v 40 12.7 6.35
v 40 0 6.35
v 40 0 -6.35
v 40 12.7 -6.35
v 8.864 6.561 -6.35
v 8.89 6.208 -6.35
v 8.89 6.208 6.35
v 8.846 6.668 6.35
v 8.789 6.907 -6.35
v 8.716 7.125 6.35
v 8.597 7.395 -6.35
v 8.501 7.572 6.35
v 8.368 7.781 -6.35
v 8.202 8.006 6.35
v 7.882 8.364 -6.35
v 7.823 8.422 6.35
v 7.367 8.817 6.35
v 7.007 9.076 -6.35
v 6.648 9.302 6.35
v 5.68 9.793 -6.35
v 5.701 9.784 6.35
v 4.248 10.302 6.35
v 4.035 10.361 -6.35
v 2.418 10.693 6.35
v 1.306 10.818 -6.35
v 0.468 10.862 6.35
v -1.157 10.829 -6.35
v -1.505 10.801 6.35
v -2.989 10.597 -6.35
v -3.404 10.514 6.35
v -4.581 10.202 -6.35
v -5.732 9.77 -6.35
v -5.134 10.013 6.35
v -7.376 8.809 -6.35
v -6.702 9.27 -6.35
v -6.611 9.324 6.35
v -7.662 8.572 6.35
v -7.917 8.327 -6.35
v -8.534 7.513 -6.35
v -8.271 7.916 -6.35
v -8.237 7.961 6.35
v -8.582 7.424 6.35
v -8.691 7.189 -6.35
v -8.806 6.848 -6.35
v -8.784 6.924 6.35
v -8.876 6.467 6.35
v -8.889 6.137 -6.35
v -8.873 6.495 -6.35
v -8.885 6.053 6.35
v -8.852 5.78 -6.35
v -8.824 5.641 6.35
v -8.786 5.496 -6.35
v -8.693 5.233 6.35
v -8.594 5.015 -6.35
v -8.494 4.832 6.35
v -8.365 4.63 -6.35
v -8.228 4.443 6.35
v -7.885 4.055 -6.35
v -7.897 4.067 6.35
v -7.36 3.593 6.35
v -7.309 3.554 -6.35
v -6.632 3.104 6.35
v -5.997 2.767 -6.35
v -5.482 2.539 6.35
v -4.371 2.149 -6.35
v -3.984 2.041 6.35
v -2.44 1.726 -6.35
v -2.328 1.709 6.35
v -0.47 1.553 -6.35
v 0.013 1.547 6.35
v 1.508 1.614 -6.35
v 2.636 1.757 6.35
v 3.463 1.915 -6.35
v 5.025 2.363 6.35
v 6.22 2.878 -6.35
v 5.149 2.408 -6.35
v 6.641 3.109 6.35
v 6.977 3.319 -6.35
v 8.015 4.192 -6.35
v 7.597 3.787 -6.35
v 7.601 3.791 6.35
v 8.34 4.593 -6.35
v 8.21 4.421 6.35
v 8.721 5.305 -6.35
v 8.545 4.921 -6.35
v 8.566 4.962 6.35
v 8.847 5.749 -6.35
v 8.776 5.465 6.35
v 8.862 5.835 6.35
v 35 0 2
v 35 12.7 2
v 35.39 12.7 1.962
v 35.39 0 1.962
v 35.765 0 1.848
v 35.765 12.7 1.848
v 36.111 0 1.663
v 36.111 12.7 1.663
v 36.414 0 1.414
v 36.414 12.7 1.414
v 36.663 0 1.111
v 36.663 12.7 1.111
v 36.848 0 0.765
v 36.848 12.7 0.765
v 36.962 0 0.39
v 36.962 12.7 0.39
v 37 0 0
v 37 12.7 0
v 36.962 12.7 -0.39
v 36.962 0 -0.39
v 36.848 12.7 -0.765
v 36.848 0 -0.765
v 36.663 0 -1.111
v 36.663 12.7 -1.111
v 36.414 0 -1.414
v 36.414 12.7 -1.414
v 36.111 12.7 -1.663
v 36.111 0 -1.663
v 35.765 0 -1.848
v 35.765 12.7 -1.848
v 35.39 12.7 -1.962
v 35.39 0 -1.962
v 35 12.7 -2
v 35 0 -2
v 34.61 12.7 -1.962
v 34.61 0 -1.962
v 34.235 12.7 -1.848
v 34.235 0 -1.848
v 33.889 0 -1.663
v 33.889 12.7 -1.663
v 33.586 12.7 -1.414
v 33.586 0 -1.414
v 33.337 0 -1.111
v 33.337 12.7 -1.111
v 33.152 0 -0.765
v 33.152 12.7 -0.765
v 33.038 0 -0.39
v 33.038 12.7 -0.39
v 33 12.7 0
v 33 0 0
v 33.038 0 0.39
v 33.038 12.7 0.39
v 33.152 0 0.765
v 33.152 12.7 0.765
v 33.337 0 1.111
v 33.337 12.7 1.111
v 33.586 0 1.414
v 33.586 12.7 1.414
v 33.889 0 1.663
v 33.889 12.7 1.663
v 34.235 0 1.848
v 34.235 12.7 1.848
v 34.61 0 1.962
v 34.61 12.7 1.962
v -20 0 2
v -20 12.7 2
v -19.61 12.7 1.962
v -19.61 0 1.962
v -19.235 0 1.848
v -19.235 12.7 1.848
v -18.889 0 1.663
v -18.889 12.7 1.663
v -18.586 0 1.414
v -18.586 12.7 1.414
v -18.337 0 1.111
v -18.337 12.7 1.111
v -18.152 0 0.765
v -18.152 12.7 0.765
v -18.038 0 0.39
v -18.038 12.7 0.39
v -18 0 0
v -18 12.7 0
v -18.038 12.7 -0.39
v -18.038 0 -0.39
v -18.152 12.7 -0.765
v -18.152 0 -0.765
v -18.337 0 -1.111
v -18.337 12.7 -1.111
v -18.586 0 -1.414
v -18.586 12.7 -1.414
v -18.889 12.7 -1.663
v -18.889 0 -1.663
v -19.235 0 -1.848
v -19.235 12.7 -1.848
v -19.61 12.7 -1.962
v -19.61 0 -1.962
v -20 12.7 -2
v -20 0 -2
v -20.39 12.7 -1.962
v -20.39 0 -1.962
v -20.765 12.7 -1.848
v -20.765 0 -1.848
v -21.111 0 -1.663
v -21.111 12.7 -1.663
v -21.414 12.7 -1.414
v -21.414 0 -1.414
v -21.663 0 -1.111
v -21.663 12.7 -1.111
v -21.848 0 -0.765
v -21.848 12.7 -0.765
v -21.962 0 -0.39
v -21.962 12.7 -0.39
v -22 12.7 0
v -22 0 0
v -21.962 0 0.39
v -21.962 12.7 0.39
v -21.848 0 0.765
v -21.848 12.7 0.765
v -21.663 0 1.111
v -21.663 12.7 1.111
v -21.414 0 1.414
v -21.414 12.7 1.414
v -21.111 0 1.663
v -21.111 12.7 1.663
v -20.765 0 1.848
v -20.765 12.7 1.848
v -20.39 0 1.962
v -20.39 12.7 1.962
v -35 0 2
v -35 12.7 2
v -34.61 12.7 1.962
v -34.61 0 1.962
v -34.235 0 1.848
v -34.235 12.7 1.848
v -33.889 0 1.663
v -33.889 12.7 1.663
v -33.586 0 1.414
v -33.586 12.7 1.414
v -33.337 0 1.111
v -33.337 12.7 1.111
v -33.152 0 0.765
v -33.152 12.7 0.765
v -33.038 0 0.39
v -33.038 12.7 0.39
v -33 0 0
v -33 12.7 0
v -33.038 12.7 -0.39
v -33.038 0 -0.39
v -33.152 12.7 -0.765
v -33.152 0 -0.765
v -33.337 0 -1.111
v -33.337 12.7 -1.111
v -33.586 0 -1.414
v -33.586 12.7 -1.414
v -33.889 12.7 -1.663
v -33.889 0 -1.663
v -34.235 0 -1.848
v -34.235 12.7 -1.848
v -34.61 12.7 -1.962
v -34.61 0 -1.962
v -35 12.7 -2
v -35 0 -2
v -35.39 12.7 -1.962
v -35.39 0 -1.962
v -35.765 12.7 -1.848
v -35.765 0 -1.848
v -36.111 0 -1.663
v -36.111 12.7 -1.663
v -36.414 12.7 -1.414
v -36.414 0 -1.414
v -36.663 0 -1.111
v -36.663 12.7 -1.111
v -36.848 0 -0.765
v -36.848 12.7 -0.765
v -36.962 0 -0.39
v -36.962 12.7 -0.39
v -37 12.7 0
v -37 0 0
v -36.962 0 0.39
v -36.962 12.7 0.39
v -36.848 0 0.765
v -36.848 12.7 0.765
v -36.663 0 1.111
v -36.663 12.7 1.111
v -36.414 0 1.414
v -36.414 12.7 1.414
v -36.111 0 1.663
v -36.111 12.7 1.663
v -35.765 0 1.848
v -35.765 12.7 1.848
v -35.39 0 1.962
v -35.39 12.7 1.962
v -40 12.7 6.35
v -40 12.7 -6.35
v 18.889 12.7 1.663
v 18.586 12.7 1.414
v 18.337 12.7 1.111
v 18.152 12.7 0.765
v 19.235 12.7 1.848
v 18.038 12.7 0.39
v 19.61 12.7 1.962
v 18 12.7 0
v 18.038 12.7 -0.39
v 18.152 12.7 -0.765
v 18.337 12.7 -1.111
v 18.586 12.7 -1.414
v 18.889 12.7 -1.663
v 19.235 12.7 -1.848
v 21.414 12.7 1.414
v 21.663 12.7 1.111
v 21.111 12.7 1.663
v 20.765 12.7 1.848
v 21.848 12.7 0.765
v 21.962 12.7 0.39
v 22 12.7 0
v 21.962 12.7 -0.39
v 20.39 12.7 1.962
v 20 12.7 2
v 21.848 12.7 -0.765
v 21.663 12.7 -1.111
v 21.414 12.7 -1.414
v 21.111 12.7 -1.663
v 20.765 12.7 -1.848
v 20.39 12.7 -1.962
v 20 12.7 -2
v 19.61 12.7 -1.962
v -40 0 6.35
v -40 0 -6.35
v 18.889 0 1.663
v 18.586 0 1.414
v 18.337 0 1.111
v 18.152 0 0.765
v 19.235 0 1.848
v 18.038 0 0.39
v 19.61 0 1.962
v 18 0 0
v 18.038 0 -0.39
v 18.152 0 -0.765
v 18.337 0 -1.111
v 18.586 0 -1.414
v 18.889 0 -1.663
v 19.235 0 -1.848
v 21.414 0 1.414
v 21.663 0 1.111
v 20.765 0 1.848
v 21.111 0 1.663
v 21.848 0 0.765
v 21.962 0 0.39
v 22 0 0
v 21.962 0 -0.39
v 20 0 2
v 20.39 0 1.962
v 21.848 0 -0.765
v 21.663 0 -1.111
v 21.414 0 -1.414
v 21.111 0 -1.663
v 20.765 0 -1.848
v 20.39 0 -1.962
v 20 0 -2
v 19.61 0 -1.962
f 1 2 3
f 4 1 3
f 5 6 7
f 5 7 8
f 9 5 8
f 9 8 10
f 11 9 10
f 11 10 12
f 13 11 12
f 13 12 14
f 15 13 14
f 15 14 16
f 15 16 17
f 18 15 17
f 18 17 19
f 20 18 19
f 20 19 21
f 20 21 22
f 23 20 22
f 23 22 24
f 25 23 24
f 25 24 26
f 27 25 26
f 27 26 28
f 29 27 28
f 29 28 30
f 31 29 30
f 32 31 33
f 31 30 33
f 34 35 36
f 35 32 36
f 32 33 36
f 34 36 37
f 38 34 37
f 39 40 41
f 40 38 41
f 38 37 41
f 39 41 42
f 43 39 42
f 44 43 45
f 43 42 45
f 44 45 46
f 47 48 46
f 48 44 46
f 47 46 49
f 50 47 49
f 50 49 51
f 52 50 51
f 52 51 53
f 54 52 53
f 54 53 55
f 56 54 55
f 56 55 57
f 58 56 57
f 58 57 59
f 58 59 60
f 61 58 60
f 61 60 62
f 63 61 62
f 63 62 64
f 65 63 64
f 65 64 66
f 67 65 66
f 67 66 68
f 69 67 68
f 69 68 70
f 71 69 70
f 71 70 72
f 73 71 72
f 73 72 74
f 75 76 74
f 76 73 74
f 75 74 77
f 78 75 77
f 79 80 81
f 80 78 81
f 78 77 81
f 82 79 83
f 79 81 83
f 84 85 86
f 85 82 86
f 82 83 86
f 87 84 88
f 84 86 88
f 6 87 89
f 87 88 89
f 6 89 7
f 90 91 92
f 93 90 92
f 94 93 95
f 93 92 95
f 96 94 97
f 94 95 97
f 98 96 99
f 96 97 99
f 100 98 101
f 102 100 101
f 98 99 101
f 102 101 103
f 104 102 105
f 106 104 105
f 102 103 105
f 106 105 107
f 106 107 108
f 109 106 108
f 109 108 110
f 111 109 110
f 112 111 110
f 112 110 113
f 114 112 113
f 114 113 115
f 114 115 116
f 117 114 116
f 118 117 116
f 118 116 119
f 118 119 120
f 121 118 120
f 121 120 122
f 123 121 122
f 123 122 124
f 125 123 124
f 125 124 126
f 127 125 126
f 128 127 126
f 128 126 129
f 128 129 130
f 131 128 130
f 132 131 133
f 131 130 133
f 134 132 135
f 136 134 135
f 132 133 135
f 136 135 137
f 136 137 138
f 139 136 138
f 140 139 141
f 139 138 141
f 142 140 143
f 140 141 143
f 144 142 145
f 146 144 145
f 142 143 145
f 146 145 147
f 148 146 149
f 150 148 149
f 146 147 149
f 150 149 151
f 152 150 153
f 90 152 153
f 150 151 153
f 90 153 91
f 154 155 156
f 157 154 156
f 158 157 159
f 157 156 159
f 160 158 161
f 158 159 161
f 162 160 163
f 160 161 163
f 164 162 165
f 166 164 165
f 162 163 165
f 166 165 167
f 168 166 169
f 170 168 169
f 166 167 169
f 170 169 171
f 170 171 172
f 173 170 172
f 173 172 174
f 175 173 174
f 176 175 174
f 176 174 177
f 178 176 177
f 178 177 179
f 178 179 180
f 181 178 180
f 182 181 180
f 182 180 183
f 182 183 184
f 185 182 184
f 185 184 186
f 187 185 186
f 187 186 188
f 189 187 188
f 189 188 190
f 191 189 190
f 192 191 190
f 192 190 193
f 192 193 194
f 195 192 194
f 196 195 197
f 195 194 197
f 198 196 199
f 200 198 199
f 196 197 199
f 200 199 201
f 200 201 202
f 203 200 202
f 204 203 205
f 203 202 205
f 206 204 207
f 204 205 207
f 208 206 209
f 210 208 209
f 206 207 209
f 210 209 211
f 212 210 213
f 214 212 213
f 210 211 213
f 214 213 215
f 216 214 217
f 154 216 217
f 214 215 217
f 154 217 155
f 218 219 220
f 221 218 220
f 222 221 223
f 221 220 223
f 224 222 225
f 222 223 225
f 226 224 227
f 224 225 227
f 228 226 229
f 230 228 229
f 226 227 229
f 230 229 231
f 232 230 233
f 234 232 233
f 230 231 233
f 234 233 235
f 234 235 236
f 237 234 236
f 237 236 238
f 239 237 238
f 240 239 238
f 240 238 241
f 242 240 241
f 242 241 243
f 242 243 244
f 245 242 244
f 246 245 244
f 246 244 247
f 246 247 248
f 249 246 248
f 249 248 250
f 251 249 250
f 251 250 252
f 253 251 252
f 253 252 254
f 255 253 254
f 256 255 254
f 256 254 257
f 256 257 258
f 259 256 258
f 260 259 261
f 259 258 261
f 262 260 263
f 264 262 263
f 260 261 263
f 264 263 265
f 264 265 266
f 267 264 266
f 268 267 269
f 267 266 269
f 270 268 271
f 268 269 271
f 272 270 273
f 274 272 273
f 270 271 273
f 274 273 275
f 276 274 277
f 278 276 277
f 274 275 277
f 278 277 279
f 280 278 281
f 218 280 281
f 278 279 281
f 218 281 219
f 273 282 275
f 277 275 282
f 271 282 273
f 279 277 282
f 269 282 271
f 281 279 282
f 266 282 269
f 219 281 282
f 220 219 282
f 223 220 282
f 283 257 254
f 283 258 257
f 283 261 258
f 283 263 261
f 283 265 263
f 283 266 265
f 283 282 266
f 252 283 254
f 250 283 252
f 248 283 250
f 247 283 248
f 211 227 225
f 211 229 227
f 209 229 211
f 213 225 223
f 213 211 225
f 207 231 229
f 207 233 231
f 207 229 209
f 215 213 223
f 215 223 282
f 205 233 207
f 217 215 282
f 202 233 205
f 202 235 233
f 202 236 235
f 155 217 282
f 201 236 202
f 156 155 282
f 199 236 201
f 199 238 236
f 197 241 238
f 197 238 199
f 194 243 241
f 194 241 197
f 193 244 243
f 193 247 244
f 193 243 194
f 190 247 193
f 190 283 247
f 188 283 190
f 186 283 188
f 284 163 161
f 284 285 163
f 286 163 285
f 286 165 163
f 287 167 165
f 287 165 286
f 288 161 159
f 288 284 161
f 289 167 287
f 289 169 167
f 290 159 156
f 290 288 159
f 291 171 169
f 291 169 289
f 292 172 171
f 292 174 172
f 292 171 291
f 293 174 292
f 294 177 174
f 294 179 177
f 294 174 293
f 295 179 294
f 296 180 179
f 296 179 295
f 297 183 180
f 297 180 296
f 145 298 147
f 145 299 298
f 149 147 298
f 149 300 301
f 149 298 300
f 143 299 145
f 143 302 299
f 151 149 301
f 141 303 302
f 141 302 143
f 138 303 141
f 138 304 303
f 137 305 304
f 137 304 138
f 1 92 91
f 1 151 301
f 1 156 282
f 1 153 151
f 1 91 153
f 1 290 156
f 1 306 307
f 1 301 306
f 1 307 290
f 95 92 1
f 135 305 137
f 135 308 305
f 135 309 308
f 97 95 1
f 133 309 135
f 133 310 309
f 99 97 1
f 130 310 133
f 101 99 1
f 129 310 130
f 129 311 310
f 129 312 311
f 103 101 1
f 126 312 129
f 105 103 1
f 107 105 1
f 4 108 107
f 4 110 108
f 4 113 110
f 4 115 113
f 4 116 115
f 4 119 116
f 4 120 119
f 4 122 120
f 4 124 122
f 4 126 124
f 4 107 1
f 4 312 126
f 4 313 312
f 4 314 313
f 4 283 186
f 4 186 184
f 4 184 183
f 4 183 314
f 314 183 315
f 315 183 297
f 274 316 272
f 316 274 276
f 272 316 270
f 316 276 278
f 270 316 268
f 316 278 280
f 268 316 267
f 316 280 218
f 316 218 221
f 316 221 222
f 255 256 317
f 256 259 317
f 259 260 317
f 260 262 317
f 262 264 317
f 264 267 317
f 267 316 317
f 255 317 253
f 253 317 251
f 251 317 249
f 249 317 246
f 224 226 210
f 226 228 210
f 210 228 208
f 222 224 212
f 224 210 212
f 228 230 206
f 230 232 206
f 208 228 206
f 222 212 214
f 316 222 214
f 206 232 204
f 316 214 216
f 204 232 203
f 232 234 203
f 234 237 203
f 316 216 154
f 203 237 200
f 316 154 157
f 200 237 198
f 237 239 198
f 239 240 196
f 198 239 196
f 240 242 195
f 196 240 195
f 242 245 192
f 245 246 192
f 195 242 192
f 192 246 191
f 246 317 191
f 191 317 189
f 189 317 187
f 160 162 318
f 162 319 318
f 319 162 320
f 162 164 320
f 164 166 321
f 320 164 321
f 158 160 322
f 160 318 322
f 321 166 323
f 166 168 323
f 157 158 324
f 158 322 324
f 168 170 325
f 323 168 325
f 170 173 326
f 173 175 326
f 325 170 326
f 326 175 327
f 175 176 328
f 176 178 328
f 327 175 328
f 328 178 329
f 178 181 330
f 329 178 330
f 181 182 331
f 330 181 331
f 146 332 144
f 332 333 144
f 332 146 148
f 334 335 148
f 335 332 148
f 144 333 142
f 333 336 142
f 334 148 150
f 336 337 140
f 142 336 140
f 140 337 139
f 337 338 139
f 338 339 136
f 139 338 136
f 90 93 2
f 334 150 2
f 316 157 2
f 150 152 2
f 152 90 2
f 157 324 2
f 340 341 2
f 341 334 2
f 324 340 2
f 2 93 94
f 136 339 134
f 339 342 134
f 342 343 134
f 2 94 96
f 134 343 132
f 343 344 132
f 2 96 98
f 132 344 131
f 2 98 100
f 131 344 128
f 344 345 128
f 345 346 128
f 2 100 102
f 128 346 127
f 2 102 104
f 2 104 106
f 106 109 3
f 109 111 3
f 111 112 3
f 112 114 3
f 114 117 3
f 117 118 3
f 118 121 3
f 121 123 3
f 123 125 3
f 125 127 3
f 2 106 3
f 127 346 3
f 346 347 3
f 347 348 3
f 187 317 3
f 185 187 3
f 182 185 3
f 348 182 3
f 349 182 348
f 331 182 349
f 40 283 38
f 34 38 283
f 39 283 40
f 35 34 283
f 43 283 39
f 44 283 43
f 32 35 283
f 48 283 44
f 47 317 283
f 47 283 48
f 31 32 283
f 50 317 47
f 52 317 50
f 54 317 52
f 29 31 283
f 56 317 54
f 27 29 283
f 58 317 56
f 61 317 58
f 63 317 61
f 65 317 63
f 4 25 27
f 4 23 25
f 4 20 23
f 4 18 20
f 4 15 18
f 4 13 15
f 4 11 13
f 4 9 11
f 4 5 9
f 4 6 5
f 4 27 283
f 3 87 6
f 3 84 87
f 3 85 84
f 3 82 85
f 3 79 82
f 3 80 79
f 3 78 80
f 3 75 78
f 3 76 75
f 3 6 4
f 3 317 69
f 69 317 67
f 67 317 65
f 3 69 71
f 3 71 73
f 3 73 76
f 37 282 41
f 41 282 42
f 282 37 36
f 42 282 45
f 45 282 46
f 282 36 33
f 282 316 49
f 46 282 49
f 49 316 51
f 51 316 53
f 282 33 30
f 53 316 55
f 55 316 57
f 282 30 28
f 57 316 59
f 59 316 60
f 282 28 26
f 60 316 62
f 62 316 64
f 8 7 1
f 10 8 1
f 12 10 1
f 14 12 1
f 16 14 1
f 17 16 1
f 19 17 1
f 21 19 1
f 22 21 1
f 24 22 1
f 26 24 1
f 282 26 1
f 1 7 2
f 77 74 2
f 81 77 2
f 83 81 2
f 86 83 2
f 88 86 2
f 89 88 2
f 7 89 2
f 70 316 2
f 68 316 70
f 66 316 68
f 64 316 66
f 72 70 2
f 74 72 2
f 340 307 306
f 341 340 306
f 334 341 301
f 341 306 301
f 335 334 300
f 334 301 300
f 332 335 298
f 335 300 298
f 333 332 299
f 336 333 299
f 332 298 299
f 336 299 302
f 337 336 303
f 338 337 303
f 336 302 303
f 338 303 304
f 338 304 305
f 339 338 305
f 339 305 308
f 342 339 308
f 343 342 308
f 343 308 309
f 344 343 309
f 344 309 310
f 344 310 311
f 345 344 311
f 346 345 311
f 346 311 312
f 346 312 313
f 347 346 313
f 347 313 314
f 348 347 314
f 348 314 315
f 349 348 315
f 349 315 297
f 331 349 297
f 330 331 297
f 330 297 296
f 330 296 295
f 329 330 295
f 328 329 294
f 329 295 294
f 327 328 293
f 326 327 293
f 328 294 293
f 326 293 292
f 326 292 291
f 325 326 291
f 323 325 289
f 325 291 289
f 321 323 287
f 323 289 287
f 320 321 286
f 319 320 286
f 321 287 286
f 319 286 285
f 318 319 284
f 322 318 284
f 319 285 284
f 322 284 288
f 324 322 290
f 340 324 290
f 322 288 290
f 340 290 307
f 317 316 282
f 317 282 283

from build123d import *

# Parameters (mm, degrees)
SKETCH2_W           = 80
SKETCH2_H           = 12.7
BOSS_EXTRUDE1_DEPTH = 12.7
SKETCH3_R           = 2
CUT_EXTRUDE1_DEPTH  = 43.445406112
SKETCH4_RX          = 8.89
SKETCH4_RY          = 4.6609
CUT_EXTRUDE3_DEPTH  = 44.847234804


with BuildPart() as part:
    # Sketch2 → Boss-Extrude1 (new body)
    with BuildSketch(Plane(origin=(0, 0, 0), x_dir=(1, 0, 0), z_dir=(0, 1, 0))):
        Rectangle(SKETCH2_W, SKETCH2_H)
    extrude(amount=BOSS_EXTRUDE1_DEPTH)

    # Sketch3 → Cut-Extrude1 (cut, through all)
    with BuildSketch(Plane(origin=(0, 12.7, 0), x_dir=(1, 0, 0), z_dir=(0, 1, 0))):
        with Locations(Location((-35, 0, 0), (0, 0, 270))):
            Circle(SKETCH3_R)
        with Locations(Location((-20, 0, 0), (0, 0, 270))):
            Circle(SKETCH3_R)
        with Locations(Location((35, 0, 0), (0, 0, 270))):
            Circle(SKETCH3_R)
        with Locations(Location((20, 0, 0), (0, 0, 270))):
            Circle(SKETCH3_R)
    extrude(amount=-CUT_EXTRUDE1_DEPTH, mode=Mode.SUBTRACT)

    # Sketch4 → Cut-Extrude3 (cut, through all)
    with BuildSketch(Plane.XY.offset(6.35)):
        with Locations((0, 6.20775407)):
            Ellipse(SKETCH4_RX, SKETCH4_RY)
    extrude(amount=-CUT_EXTRUDE3_DEPTH, mode=Mode.SUBTRACT)


solid = part.part
